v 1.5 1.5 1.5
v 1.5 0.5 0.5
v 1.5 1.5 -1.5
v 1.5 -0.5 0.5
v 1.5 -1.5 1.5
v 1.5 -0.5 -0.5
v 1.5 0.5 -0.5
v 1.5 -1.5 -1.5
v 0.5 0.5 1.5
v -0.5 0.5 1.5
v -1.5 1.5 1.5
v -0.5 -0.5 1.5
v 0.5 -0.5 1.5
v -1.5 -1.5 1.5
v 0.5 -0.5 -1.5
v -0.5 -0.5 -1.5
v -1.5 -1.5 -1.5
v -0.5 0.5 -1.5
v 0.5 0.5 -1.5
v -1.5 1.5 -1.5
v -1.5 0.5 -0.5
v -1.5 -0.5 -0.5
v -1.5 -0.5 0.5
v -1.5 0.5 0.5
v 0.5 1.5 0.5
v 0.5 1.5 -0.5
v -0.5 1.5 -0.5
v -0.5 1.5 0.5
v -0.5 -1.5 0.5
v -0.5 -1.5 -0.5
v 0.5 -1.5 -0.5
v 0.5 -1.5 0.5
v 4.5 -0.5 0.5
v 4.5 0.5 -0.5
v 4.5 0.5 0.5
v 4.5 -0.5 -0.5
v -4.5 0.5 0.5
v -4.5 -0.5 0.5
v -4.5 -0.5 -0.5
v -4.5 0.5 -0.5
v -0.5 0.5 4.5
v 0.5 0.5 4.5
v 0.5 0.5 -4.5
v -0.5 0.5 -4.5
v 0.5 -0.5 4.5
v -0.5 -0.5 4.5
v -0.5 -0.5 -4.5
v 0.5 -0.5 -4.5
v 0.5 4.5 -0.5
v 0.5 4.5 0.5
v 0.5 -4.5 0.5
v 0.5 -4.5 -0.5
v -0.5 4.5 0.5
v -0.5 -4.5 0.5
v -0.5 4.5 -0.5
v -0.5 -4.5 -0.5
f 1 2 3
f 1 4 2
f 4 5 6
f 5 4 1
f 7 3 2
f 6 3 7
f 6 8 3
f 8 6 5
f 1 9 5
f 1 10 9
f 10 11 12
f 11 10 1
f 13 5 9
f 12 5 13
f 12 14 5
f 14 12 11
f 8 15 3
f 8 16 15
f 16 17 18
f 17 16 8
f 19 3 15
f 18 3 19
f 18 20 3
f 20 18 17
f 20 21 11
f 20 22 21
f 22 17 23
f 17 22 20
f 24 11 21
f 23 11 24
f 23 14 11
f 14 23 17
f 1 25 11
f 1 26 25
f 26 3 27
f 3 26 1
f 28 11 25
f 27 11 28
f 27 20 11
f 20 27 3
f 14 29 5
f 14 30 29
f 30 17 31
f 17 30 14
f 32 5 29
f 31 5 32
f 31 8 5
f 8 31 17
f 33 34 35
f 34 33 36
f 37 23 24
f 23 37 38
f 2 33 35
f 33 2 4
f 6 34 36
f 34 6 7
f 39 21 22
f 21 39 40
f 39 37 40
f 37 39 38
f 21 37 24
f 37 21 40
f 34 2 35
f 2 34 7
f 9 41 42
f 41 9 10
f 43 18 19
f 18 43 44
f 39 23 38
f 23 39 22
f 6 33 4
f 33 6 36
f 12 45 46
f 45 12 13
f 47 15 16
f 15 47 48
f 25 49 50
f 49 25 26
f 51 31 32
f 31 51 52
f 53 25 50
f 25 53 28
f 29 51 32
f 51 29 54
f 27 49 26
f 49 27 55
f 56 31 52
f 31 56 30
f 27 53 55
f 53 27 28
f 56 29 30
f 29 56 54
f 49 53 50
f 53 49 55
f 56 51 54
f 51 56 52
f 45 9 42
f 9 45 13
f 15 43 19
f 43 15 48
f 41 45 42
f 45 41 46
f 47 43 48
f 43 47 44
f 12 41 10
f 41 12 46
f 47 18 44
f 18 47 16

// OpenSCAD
current_color = "ALL";

module multicolor(color) {
    if (color==current_color || current_color == "ALL"){
        color(color) children();
    }
}


multicolor("white") cube(size=3,center=true);
multicolor("red") cube(size=[9,1,1],center=true);
multicolor("green") cube(size=[1,9,1],center=true);
multicolor("blue") cube(size=[1,1,9],center=true);
